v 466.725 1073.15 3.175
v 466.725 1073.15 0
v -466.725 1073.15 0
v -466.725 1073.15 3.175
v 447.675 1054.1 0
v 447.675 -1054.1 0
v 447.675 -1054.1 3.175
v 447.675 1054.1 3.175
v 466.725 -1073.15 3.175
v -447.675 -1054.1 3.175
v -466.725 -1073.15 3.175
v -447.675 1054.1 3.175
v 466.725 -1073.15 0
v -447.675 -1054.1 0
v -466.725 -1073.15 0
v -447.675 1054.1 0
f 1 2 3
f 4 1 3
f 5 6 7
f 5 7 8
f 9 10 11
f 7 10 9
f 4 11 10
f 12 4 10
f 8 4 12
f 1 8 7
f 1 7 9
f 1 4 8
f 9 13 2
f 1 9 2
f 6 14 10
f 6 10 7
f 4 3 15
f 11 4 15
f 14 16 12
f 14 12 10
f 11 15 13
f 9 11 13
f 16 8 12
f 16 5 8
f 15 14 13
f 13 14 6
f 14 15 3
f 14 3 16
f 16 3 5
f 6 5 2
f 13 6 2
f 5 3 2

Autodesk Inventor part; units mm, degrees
ref_plane "YZ Plane" through (0, 0, 0) normal (1, 0, 0) x (0, 1, 0)
ref_plane "XZ Plane" through (0, 0, 0) normal (0, 1, 0) x (-1, 0, 0)
ref_plane "XY Plane" through (0, 0, 0) normal (0, 0, 1) x (1, 0, 0)
sketch "Sketch1" plane through (0, 0, 0) normal (0, 0, 1) x (1, 0, 0)
  line L0 (-447.675, -1054.1) -> (447.675, -1054.1)
  line L1 (447.675, -1054.1) -> (447.675, 1054.1)
  line L2 (447.675, 1054.1) -> (-447.675, 1054.1)
  line L3 (-447.675, 1054.1) -> (-447.675, -1054.1)
  line L4 (-447.675, -1054.1) -> (447.675, 1054.1) construction
  line L5 (447.675, -1054.1) -> (-447.675, 1054.1) construction
  line L6 (-466.725, -1073.15) -> (466.725, -1073.15)
  line L7 (466.725, -1073.15) -> (466.725, 1073.15)
  line L8 (466.725, 1073.15) -> (-466.725, 1073.15)
  line L9 (-466.725, 1073.15) -> (-466.725, -1073.15)
  line L10 (-466.725, -1073.15) -> (466.725, 1073.15) construction
  line L11 (466.725, -1073.15) -> (-466.725, 1073.15) construction
  point P0 (0, 0)
  dimension "d0" = 895.35
  dimension "d1" = 2108.2
  dimension "d2" = 19.05
  dimension "d3" = 19.05
extrude "Extrusion1" add sketch "Sketch1" along normal blind 3.175
equation "\"d0\" = doorWidth"
equation "\"d1\" = doorHeight"
equation "\"wallThick\" = 44.45"
equation "\"roomWidth\" = 3048"
equation "\"roomDepth\" = 3657.6"
equation "\"roomHeight\" = 2438.4"
equation "\"doorWidth\" = 895.35"
equation "\"doorHeight\" = 2108.2"
equation "\"doorX\" = 774.7"
equation "\"doorY\" = 88.9"
equation "\"doorLip\" = 76.2"
equation "\"doorThick\" = 57.15"
equation "\"tubeD\" = 19.05"
equation "\"tubeTurnR\" = 76.2"
properties part number "door_rim"
